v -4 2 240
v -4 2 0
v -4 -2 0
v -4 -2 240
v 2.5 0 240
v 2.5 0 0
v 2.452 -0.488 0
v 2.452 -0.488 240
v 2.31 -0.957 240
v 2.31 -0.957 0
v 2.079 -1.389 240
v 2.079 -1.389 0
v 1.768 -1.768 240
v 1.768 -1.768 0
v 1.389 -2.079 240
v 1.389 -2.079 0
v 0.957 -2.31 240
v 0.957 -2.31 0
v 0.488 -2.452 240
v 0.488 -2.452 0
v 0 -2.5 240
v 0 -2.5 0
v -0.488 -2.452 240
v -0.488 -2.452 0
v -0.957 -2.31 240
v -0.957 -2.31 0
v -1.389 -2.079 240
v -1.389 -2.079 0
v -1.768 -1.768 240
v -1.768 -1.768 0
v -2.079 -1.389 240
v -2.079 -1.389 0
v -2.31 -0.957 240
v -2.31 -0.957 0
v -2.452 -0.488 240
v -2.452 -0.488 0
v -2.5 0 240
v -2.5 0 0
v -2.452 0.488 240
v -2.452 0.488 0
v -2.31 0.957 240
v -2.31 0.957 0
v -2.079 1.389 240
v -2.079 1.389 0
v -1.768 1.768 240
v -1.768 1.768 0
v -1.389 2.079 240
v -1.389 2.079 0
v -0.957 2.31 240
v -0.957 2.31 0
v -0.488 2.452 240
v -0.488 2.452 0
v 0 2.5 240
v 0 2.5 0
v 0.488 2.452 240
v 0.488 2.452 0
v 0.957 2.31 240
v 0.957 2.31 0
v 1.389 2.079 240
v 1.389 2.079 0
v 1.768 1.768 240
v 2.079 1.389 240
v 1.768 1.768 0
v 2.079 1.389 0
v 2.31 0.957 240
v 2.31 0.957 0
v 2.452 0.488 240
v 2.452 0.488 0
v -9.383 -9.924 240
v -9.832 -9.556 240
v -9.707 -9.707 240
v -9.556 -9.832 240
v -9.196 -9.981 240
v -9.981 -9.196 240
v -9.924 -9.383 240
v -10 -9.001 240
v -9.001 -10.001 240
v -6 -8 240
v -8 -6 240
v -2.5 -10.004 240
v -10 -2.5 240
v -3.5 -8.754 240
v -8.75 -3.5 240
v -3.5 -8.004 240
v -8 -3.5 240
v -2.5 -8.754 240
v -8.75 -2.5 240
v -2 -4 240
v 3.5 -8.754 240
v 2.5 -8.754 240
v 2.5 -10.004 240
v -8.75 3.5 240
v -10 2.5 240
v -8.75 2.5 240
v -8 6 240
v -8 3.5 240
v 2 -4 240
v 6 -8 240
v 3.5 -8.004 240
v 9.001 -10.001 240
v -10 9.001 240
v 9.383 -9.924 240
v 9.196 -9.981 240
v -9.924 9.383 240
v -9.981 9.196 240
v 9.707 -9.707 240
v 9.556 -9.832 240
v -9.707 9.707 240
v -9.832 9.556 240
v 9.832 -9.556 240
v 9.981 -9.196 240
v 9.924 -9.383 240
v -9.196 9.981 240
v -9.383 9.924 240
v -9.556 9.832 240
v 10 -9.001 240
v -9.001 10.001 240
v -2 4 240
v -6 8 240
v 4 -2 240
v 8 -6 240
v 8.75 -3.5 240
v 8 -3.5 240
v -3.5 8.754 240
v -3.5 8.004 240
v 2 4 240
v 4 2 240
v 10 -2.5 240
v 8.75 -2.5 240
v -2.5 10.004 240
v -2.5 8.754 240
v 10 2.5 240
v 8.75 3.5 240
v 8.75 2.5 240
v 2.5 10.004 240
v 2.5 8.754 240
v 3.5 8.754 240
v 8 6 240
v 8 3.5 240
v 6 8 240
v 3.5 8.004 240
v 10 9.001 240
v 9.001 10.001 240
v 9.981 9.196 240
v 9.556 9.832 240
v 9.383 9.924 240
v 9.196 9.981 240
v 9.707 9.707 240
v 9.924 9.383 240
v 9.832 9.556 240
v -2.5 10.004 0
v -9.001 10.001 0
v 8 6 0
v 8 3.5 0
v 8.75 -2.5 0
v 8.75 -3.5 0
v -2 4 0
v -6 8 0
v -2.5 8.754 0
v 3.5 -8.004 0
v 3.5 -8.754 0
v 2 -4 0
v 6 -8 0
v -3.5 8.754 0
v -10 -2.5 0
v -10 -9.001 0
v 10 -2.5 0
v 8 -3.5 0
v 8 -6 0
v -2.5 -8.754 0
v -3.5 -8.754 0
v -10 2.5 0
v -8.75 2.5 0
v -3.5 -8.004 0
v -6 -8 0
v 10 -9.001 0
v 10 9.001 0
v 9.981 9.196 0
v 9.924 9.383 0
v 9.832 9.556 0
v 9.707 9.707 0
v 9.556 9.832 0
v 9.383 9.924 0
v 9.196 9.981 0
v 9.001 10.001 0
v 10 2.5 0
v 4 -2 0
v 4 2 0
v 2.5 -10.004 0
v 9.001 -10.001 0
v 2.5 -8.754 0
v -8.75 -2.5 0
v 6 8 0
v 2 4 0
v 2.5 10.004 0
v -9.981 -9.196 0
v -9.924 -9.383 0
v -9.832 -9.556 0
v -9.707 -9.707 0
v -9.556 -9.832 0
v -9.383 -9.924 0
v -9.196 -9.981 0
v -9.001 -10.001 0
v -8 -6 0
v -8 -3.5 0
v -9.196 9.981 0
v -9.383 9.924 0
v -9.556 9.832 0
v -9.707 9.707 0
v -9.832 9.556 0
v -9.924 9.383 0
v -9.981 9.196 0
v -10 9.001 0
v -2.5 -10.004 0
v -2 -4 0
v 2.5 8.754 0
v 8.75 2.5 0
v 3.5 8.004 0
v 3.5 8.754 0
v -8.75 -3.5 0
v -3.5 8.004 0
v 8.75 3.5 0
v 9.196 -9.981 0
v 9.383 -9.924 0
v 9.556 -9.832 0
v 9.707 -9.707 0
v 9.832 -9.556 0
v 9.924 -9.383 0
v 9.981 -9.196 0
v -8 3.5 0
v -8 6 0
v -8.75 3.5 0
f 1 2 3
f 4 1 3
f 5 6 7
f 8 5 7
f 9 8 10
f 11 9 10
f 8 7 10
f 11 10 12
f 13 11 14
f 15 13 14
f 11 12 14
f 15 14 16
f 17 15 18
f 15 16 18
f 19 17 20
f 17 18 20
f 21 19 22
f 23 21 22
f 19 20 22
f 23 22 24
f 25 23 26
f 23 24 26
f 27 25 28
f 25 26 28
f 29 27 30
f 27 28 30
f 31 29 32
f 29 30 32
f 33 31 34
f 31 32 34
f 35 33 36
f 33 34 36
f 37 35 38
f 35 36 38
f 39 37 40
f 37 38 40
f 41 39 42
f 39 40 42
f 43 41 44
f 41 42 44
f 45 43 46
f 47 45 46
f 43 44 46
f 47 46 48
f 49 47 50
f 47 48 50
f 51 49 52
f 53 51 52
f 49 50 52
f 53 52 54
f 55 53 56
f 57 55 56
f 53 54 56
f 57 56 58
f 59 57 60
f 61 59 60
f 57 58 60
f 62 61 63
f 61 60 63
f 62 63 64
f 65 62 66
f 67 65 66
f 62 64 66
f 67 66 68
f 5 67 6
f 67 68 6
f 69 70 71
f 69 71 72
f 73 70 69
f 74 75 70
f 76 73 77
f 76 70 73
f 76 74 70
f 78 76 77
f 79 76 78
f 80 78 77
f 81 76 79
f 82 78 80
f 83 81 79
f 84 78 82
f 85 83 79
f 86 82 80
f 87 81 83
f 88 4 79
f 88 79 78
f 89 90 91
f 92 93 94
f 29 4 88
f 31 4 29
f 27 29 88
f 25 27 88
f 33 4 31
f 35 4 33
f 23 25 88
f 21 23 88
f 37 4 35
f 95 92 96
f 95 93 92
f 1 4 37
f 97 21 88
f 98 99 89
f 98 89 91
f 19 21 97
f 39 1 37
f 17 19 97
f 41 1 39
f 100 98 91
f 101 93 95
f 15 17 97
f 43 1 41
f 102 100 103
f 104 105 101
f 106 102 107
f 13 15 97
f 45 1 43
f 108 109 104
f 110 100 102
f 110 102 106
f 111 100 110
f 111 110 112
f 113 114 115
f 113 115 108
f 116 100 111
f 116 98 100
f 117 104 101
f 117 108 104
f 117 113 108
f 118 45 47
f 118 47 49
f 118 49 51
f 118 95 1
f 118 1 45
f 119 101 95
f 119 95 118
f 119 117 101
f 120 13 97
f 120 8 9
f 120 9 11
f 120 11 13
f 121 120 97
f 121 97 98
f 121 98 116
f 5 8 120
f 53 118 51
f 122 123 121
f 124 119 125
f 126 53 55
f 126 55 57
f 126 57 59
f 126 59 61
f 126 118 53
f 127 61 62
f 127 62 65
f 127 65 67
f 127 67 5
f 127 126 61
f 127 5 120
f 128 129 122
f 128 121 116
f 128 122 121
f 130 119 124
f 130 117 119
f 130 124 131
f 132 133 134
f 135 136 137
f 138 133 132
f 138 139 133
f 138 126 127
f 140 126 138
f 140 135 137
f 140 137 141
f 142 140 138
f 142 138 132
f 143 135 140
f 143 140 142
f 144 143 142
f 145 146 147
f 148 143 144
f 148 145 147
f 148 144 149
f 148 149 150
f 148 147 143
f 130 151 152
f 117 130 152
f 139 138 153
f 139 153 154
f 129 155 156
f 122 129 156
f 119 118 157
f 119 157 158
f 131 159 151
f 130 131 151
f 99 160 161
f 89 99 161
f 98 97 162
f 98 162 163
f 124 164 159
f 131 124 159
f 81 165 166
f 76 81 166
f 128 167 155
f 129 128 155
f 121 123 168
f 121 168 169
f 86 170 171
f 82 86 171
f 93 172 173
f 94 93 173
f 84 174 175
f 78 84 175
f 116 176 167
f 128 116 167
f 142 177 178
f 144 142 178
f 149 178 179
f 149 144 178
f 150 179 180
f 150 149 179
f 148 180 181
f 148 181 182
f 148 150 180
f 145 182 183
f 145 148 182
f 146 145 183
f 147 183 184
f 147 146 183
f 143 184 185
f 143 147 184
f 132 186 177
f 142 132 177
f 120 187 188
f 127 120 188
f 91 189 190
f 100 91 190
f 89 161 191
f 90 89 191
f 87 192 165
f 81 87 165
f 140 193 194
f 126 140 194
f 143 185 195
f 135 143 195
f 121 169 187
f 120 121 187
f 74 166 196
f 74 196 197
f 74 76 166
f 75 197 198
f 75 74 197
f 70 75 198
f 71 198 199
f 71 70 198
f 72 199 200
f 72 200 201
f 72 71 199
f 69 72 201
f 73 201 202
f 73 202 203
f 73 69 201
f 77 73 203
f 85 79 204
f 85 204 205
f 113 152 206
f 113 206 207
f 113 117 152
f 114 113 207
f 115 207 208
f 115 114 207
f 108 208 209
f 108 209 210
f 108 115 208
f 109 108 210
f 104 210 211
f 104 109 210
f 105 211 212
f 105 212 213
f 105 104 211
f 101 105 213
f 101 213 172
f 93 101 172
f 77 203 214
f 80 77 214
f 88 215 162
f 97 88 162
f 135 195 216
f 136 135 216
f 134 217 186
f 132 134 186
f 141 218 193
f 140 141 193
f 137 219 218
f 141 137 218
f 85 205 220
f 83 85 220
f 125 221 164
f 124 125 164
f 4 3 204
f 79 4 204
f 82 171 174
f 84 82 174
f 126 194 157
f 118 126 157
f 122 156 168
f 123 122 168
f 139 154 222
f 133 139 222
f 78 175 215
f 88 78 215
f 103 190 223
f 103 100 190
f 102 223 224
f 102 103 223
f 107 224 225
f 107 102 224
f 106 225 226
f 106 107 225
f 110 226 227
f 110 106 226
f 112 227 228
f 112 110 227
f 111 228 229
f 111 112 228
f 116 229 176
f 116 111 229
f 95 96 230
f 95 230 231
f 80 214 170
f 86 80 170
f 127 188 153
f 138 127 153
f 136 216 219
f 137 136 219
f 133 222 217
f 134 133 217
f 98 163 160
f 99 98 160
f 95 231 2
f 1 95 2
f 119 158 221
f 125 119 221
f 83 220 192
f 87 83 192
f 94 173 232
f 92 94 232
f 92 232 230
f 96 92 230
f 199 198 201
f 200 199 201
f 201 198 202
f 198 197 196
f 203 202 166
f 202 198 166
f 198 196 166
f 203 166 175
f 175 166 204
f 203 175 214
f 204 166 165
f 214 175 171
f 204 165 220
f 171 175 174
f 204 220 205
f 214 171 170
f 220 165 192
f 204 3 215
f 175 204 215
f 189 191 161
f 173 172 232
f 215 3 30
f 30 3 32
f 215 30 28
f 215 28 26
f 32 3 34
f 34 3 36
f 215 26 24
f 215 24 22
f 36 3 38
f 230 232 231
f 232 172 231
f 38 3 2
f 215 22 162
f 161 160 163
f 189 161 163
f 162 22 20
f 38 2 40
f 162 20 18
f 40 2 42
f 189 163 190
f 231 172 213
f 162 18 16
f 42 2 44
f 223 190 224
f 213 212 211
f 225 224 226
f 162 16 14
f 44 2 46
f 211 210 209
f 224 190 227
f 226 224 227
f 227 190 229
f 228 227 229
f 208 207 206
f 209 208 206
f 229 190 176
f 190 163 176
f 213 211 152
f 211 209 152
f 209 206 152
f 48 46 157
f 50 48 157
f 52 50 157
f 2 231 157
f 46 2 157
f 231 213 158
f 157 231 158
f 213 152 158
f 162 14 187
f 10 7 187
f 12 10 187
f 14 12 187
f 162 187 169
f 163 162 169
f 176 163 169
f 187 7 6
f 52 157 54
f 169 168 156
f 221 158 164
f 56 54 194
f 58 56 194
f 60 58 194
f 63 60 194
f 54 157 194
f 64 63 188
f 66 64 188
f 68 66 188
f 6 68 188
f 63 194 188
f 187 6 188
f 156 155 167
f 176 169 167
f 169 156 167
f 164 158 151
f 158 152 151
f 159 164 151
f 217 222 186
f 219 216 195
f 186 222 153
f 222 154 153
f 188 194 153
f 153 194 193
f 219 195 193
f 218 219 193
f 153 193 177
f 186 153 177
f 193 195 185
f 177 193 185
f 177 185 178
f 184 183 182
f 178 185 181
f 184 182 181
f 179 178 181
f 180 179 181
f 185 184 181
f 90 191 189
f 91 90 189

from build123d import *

# Parameters (mm, degrees)
F1_DEPTH = 240
F2_R     = 1
F3_R     = 2.5
F4_DEPTH = 240


with BuildPart() as f1:
    # F0 (on Top) → F1 (new body)
    with BuildSketch(Plane.XY):
        Polygon((0, 4), (-2, 4), (-6, 8), (-3.5, 8.0038368255), (-3.5, 8.7538368255), (-2.5, 8.7538368255), (-2.5, 10.0038368255), (-10, 10), (-10, 2.4999990186), (-8.75, 2.4999990186), (-8.75, 3.4999990186), (-8, 3.4999990186), (-8, 5.9999990186), (-4, 2), (-4, 0), (-4, -2), (-8, -5.9999990186), (-8, -3.4999990186), (-8.75, -3.4999990186), (-8.75, -2.4999990186), (-10, -2.4999990186), (-10, -10), (-2.5, -10.0038368255), (-2.5, -8.7538368255), (-3.5, -8.7538368255), (-3.5, -8.0038368255), (-6, -8), (-2, -4), (0, -4), (2, -4), (6, -8), (3.5, -8.0038368255), (3.5, -8.7538368255), (2.5, -8.7538368255), (2.5, -10.0038368255), (10, -10), (10, -2.4999990186), (8.75, -2.4999990186), (8.75, -3.4999990186), (8, -3.4999990186), (8, -5.9999990186), (4, -2), (4, 0), (4, 2), (8, 5.9999990186), (8, 3.4999990186), (8.75, 3.4999990186), (8.75, 2.4999990186), (10, 2.4999990186), (10, 10), (2.5, 10.0038368255), (2.5, 8.7538368255), (3.5, 8.7538368255), (3.5, 8.0038368255), (6, 8), (2, 4), align=None)
    extrude(amount=F1_DEPTH)

    # F2
    f2_edges = [f1.edges().sort_by_distance(p)[0] for p in [
        (-10, -10, 120),
        (10, -10, 120),
        (-10, 10, 120),
        (10, 10, 120),
    ]]
    fillet(f2_edges, radius=F2_R)

    # F3 (on face) → F4 (cut, through all)
    with BuildSketch(Plane(origin=(0, 0, 0), x_dir=(1, 0, 0), z_dir=(0, 0, -1))):
        Circle(F3_R)
    extrude(amount=-F4_DEPTH, mode=Mode.SUBTRACT)


solid = f1.part
